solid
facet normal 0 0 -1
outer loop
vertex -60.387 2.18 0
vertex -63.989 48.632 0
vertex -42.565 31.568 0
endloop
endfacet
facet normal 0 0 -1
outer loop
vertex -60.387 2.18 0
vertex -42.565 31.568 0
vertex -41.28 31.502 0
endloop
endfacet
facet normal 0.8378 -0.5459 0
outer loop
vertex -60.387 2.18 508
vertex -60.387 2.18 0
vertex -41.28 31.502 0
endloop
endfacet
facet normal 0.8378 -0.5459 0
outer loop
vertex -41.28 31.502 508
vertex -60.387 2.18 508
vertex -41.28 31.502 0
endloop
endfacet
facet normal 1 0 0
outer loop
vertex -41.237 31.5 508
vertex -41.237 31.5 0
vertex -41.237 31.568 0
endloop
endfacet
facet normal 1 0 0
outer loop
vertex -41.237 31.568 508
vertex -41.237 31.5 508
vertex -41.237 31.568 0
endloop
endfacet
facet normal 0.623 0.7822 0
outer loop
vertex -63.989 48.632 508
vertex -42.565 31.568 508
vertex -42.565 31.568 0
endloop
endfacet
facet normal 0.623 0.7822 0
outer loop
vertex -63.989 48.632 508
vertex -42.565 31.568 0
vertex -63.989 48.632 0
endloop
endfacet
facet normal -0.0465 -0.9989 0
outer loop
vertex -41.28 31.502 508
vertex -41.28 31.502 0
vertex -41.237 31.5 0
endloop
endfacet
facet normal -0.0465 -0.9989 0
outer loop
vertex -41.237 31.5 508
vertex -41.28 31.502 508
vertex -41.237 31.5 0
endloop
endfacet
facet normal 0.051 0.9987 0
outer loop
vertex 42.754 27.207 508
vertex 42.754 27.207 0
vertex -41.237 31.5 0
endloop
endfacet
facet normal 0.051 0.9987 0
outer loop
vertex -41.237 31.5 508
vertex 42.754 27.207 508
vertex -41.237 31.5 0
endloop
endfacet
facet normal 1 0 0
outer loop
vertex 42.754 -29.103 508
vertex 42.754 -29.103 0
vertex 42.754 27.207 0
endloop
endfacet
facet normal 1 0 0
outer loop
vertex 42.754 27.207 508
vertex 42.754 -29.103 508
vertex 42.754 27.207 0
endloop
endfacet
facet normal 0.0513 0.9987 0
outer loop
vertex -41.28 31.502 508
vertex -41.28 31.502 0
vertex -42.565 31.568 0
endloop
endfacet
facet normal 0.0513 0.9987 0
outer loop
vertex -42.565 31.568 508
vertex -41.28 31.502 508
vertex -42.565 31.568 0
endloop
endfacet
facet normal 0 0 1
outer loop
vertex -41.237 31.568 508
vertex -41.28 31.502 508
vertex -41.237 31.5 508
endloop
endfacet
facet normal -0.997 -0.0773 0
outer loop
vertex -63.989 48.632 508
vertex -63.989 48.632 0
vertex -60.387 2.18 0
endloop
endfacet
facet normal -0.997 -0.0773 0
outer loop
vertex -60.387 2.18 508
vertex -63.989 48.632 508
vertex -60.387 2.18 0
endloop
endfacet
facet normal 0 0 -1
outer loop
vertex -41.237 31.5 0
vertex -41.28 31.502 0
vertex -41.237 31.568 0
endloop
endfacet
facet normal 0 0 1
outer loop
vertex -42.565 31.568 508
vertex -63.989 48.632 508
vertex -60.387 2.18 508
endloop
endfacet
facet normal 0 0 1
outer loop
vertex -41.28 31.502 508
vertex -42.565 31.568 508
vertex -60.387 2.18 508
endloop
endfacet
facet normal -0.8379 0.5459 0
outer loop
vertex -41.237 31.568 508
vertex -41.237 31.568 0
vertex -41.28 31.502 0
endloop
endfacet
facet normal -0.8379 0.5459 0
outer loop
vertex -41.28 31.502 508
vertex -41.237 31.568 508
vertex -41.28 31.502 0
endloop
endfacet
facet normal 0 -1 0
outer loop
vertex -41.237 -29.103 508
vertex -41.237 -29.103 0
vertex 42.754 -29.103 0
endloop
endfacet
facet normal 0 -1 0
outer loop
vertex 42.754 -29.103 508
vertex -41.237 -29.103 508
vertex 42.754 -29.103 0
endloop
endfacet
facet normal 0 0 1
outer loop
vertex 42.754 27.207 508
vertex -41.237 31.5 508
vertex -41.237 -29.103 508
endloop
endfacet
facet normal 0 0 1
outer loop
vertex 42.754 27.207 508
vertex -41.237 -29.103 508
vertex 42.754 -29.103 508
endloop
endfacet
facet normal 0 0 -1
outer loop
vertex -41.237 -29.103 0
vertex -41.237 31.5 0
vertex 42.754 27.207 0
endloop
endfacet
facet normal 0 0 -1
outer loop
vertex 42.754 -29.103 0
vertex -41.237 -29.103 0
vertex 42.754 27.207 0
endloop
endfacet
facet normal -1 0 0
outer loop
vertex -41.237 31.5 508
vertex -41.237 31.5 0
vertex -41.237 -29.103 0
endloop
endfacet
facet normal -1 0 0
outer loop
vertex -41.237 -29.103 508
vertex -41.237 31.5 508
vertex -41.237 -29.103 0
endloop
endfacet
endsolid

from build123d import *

# Parameters (mm, degrees)
F1_DEPTH = 508


with BuildPart() as f1:
    # F0 (on Top) → F1 (new body)
    with BuildSketch(Plane.XY):
        Polygon((42.754158, 27.207192), (-41.23738, 31.500094), (-41.23738, -29.103164), (42.754158, -29.103164), align=None)
        Polygon((-41.23738, 31.567927), (-41.280157, 31.50228), (-41.23738, 31.500094), align=None)
        Polygon((-41.280157, 31.50228), (-42.564563, 31.567927), (-63.989043, 48.631672), (-60.386695, 2.180367), align=None)
    extrude(amount=F1_DEPTH)


solid = f1.part
